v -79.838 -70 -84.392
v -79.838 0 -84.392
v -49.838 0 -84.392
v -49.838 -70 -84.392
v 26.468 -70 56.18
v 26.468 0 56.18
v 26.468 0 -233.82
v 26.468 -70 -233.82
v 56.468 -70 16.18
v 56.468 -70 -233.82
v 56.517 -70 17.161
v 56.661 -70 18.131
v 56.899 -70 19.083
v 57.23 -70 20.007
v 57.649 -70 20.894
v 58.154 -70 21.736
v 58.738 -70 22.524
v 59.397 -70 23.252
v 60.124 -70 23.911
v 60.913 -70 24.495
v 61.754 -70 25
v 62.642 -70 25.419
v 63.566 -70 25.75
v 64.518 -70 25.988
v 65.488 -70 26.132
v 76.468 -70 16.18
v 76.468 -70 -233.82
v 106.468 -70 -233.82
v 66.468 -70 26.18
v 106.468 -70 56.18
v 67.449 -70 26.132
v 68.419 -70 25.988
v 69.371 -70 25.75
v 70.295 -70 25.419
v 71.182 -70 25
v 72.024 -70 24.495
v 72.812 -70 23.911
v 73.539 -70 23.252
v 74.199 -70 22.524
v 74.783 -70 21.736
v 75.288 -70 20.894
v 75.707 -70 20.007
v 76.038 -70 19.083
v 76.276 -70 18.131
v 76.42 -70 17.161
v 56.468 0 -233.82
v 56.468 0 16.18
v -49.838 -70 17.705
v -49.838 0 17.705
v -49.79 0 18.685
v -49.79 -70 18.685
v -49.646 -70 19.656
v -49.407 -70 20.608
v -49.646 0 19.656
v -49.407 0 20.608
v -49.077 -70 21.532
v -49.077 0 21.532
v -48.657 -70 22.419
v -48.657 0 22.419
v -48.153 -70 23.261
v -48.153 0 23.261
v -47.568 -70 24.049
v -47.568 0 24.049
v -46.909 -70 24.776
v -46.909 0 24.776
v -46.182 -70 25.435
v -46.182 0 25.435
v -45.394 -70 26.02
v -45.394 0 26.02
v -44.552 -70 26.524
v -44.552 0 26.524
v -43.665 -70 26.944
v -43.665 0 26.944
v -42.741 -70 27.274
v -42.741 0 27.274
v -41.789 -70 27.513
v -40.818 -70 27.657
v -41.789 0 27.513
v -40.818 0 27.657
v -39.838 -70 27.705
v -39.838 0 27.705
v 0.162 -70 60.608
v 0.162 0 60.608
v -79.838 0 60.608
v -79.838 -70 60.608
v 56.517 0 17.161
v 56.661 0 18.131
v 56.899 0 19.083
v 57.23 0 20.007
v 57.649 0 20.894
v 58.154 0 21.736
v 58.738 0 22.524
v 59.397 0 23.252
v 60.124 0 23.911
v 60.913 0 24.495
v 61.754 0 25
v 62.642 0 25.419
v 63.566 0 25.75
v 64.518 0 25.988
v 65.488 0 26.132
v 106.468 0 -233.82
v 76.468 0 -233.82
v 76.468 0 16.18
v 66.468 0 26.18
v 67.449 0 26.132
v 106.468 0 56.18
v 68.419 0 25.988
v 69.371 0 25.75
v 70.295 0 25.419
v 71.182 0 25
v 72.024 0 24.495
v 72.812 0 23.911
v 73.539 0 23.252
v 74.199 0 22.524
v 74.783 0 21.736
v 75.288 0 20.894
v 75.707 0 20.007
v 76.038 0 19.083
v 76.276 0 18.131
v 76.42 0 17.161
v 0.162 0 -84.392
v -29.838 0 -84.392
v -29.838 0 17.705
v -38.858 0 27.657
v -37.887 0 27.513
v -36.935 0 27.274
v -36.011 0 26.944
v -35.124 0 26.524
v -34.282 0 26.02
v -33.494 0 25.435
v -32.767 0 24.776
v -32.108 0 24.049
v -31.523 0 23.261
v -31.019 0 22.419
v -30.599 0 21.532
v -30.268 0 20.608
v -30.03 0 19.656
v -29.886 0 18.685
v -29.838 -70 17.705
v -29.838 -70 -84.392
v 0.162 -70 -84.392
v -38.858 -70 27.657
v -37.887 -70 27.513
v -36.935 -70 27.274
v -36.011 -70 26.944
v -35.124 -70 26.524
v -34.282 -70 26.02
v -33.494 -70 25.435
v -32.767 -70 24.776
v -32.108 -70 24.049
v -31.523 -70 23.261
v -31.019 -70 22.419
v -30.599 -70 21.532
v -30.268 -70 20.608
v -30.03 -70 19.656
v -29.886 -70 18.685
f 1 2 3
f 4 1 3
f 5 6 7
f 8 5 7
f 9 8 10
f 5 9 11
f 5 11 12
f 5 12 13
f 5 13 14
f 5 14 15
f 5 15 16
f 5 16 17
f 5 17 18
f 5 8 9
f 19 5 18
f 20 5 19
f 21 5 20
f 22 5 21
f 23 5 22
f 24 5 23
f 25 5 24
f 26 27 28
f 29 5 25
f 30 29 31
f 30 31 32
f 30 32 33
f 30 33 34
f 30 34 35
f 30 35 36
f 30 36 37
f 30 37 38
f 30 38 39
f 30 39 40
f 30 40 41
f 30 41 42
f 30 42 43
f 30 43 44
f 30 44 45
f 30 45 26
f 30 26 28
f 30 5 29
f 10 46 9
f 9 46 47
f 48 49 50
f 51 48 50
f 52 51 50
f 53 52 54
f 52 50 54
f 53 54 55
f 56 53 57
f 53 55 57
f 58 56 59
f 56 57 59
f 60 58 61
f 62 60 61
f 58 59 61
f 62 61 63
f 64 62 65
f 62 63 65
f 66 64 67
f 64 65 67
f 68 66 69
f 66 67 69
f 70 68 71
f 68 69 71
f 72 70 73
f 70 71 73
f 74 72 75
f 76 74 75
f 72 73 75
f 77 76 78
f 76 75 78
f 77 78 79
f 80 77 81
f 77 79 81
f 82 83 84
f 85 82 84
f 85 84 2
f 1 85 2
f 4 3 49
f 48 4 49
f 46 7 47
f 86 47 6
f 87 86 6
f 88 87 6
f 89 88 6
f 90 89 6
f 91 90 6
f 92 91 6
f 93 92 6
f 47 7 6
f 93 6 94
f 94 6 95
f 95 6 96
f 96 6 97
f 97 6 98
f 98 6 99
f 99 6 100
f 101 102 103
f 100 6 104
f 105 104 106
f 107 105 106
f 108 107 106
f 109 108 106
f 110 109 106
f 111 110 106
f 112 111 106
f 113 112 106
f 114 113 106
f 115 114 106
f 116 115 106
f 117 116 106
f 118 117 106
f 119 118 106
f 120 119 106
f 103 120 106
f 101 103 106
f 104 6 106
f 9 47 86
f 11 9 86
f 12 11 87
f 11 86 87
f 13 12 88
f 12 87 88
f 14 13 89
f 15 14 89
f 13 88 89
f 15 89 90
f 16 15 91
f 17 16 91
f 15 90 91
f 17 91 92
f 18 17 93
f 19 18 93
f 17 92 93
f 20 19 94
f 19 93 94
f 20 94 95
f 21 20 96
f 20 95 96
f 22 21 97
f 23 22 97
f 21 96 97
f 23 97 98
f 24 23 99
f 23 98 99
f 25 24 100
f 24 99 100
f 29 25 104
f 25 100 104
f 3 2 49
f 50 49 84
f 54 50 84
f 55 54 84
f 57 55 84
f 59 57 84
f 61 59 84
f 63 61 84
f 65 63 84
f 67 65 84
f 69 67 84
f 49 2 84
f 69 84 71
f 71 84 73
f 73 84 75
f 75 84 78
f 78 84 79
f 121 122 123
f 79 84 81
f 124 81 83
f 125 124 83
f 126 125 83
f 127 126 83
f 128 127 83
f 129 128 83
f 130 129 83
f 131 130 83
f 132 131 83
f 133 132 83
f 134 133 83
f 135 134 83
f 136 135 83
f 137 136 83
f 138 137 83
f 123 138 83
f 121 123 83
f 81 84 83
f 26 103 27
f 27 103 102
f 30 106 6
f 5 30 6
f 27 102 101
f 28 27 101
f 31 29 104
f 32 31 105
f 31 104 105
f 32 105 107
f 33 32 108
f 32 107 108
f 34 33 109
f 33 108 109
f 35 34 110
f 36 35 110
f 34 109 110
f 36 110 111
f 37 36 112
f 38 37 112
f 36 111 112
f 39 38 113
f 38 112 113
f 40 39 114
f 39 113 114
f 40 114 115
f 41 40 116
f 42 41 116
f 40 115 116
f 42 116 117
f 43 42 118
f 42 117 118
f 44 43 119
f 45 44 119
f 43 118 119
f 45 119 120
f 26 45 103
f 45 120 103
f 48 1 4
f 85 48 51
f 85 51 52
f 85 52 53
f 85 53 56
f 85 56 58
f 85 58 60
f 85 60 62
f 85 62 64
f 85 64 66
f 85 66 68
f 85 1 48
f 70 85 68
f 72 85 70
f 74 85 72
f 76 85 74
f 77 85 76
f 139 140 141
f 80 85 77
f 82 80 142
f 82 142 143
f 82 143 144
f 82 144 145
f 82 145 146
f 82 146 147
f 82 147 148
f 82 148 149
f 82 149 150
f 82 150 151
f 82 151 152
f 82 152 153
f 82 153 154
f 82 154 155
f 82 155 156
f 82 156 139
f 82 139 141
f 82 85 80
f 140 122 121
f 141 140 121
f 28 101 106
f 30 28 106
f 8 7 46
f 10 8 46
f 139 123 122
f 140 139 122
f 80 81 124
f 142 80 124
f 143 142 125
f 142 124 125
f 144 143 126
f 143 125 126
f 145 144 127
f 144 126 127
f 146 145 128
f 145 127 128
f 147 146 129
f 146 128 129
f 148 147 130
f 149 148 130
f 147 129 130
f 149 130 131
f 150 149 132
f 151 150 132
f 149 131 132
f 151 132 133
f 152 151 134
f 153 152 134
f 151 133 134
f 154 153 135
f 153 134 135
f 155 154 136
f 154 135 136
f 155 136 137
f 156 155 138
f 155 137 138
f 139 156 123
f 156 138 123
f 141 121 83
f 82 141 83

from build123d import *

# Parameters (mm, degrees)
F1_DEPTH = 70
F3_DEPTH = 70


with BuildPart() as f1:
    # F0 (on Front) → F1 (new body)
    with BuildSketch(Plane.XZ):
        with BuildLine():
            Line((-79.837885, 60.60828), (-79.837885, -84.39172))
            Line((-79.837885, -84.39172), (-49.837885, -84.39172))
            Line((-49.837885, -84.39172), (-49.837885, 17.705042))
            ThreePointArc((-49.837885, 17.705042), (-46.908953, 24.77611), (-39.837885, 27.705042))
            ThreePointArc((-39.837885, 27.705042), (-32.766817, 24.77611), (-29.837885, 17.705042))
            Line((-29.837885, 17.705042), (-29.837885, -84.39172))
            Line((-29.837885, -84.39172), (0.162115, -84.39172))
            Line((0.162115, -84.39172), (0.162115, 60.60828))
            Line((0.162115, 60.60828), (-79.837885, 60.60828))
        make_face()
    extrude(amount=F1_DEPTH)


with BuildPart() as f3:
    # F2 (on Front) → F3 (new body)
    with BuildSketch(Plane.XZ):
        with BuildLine():
            Line((26.468424, 56.180466), (26.468424, -233.819534))
            Line((26.468424, -233.819534), (56.468424, -233.819534))
            Line((56.468424, -233.819534), (56.468424, 16.180466))
            ThreePointArc((56.468424, 16.180466), (59.397356, 23.251534), (66.468424, 26.180466))
            ThreePointArc((66.468424, 26.180466), (73.539492, 23.251534), (76.468424, 16.180466))
            Line((76.468424, 16.180466), (76.468424, -233.819534))
            Line((76.468424, -233.819534), (106.468424, -233.819534))
            Line((106.468424, -233.819534), (106.468424, 56.180466))
            Line((106.468424, 56.180466), (26.468424, 56.180466))
        make_face()
    extrude(amount=F3_DEPTH)


solid = Compound([f1.part, f3.part])
